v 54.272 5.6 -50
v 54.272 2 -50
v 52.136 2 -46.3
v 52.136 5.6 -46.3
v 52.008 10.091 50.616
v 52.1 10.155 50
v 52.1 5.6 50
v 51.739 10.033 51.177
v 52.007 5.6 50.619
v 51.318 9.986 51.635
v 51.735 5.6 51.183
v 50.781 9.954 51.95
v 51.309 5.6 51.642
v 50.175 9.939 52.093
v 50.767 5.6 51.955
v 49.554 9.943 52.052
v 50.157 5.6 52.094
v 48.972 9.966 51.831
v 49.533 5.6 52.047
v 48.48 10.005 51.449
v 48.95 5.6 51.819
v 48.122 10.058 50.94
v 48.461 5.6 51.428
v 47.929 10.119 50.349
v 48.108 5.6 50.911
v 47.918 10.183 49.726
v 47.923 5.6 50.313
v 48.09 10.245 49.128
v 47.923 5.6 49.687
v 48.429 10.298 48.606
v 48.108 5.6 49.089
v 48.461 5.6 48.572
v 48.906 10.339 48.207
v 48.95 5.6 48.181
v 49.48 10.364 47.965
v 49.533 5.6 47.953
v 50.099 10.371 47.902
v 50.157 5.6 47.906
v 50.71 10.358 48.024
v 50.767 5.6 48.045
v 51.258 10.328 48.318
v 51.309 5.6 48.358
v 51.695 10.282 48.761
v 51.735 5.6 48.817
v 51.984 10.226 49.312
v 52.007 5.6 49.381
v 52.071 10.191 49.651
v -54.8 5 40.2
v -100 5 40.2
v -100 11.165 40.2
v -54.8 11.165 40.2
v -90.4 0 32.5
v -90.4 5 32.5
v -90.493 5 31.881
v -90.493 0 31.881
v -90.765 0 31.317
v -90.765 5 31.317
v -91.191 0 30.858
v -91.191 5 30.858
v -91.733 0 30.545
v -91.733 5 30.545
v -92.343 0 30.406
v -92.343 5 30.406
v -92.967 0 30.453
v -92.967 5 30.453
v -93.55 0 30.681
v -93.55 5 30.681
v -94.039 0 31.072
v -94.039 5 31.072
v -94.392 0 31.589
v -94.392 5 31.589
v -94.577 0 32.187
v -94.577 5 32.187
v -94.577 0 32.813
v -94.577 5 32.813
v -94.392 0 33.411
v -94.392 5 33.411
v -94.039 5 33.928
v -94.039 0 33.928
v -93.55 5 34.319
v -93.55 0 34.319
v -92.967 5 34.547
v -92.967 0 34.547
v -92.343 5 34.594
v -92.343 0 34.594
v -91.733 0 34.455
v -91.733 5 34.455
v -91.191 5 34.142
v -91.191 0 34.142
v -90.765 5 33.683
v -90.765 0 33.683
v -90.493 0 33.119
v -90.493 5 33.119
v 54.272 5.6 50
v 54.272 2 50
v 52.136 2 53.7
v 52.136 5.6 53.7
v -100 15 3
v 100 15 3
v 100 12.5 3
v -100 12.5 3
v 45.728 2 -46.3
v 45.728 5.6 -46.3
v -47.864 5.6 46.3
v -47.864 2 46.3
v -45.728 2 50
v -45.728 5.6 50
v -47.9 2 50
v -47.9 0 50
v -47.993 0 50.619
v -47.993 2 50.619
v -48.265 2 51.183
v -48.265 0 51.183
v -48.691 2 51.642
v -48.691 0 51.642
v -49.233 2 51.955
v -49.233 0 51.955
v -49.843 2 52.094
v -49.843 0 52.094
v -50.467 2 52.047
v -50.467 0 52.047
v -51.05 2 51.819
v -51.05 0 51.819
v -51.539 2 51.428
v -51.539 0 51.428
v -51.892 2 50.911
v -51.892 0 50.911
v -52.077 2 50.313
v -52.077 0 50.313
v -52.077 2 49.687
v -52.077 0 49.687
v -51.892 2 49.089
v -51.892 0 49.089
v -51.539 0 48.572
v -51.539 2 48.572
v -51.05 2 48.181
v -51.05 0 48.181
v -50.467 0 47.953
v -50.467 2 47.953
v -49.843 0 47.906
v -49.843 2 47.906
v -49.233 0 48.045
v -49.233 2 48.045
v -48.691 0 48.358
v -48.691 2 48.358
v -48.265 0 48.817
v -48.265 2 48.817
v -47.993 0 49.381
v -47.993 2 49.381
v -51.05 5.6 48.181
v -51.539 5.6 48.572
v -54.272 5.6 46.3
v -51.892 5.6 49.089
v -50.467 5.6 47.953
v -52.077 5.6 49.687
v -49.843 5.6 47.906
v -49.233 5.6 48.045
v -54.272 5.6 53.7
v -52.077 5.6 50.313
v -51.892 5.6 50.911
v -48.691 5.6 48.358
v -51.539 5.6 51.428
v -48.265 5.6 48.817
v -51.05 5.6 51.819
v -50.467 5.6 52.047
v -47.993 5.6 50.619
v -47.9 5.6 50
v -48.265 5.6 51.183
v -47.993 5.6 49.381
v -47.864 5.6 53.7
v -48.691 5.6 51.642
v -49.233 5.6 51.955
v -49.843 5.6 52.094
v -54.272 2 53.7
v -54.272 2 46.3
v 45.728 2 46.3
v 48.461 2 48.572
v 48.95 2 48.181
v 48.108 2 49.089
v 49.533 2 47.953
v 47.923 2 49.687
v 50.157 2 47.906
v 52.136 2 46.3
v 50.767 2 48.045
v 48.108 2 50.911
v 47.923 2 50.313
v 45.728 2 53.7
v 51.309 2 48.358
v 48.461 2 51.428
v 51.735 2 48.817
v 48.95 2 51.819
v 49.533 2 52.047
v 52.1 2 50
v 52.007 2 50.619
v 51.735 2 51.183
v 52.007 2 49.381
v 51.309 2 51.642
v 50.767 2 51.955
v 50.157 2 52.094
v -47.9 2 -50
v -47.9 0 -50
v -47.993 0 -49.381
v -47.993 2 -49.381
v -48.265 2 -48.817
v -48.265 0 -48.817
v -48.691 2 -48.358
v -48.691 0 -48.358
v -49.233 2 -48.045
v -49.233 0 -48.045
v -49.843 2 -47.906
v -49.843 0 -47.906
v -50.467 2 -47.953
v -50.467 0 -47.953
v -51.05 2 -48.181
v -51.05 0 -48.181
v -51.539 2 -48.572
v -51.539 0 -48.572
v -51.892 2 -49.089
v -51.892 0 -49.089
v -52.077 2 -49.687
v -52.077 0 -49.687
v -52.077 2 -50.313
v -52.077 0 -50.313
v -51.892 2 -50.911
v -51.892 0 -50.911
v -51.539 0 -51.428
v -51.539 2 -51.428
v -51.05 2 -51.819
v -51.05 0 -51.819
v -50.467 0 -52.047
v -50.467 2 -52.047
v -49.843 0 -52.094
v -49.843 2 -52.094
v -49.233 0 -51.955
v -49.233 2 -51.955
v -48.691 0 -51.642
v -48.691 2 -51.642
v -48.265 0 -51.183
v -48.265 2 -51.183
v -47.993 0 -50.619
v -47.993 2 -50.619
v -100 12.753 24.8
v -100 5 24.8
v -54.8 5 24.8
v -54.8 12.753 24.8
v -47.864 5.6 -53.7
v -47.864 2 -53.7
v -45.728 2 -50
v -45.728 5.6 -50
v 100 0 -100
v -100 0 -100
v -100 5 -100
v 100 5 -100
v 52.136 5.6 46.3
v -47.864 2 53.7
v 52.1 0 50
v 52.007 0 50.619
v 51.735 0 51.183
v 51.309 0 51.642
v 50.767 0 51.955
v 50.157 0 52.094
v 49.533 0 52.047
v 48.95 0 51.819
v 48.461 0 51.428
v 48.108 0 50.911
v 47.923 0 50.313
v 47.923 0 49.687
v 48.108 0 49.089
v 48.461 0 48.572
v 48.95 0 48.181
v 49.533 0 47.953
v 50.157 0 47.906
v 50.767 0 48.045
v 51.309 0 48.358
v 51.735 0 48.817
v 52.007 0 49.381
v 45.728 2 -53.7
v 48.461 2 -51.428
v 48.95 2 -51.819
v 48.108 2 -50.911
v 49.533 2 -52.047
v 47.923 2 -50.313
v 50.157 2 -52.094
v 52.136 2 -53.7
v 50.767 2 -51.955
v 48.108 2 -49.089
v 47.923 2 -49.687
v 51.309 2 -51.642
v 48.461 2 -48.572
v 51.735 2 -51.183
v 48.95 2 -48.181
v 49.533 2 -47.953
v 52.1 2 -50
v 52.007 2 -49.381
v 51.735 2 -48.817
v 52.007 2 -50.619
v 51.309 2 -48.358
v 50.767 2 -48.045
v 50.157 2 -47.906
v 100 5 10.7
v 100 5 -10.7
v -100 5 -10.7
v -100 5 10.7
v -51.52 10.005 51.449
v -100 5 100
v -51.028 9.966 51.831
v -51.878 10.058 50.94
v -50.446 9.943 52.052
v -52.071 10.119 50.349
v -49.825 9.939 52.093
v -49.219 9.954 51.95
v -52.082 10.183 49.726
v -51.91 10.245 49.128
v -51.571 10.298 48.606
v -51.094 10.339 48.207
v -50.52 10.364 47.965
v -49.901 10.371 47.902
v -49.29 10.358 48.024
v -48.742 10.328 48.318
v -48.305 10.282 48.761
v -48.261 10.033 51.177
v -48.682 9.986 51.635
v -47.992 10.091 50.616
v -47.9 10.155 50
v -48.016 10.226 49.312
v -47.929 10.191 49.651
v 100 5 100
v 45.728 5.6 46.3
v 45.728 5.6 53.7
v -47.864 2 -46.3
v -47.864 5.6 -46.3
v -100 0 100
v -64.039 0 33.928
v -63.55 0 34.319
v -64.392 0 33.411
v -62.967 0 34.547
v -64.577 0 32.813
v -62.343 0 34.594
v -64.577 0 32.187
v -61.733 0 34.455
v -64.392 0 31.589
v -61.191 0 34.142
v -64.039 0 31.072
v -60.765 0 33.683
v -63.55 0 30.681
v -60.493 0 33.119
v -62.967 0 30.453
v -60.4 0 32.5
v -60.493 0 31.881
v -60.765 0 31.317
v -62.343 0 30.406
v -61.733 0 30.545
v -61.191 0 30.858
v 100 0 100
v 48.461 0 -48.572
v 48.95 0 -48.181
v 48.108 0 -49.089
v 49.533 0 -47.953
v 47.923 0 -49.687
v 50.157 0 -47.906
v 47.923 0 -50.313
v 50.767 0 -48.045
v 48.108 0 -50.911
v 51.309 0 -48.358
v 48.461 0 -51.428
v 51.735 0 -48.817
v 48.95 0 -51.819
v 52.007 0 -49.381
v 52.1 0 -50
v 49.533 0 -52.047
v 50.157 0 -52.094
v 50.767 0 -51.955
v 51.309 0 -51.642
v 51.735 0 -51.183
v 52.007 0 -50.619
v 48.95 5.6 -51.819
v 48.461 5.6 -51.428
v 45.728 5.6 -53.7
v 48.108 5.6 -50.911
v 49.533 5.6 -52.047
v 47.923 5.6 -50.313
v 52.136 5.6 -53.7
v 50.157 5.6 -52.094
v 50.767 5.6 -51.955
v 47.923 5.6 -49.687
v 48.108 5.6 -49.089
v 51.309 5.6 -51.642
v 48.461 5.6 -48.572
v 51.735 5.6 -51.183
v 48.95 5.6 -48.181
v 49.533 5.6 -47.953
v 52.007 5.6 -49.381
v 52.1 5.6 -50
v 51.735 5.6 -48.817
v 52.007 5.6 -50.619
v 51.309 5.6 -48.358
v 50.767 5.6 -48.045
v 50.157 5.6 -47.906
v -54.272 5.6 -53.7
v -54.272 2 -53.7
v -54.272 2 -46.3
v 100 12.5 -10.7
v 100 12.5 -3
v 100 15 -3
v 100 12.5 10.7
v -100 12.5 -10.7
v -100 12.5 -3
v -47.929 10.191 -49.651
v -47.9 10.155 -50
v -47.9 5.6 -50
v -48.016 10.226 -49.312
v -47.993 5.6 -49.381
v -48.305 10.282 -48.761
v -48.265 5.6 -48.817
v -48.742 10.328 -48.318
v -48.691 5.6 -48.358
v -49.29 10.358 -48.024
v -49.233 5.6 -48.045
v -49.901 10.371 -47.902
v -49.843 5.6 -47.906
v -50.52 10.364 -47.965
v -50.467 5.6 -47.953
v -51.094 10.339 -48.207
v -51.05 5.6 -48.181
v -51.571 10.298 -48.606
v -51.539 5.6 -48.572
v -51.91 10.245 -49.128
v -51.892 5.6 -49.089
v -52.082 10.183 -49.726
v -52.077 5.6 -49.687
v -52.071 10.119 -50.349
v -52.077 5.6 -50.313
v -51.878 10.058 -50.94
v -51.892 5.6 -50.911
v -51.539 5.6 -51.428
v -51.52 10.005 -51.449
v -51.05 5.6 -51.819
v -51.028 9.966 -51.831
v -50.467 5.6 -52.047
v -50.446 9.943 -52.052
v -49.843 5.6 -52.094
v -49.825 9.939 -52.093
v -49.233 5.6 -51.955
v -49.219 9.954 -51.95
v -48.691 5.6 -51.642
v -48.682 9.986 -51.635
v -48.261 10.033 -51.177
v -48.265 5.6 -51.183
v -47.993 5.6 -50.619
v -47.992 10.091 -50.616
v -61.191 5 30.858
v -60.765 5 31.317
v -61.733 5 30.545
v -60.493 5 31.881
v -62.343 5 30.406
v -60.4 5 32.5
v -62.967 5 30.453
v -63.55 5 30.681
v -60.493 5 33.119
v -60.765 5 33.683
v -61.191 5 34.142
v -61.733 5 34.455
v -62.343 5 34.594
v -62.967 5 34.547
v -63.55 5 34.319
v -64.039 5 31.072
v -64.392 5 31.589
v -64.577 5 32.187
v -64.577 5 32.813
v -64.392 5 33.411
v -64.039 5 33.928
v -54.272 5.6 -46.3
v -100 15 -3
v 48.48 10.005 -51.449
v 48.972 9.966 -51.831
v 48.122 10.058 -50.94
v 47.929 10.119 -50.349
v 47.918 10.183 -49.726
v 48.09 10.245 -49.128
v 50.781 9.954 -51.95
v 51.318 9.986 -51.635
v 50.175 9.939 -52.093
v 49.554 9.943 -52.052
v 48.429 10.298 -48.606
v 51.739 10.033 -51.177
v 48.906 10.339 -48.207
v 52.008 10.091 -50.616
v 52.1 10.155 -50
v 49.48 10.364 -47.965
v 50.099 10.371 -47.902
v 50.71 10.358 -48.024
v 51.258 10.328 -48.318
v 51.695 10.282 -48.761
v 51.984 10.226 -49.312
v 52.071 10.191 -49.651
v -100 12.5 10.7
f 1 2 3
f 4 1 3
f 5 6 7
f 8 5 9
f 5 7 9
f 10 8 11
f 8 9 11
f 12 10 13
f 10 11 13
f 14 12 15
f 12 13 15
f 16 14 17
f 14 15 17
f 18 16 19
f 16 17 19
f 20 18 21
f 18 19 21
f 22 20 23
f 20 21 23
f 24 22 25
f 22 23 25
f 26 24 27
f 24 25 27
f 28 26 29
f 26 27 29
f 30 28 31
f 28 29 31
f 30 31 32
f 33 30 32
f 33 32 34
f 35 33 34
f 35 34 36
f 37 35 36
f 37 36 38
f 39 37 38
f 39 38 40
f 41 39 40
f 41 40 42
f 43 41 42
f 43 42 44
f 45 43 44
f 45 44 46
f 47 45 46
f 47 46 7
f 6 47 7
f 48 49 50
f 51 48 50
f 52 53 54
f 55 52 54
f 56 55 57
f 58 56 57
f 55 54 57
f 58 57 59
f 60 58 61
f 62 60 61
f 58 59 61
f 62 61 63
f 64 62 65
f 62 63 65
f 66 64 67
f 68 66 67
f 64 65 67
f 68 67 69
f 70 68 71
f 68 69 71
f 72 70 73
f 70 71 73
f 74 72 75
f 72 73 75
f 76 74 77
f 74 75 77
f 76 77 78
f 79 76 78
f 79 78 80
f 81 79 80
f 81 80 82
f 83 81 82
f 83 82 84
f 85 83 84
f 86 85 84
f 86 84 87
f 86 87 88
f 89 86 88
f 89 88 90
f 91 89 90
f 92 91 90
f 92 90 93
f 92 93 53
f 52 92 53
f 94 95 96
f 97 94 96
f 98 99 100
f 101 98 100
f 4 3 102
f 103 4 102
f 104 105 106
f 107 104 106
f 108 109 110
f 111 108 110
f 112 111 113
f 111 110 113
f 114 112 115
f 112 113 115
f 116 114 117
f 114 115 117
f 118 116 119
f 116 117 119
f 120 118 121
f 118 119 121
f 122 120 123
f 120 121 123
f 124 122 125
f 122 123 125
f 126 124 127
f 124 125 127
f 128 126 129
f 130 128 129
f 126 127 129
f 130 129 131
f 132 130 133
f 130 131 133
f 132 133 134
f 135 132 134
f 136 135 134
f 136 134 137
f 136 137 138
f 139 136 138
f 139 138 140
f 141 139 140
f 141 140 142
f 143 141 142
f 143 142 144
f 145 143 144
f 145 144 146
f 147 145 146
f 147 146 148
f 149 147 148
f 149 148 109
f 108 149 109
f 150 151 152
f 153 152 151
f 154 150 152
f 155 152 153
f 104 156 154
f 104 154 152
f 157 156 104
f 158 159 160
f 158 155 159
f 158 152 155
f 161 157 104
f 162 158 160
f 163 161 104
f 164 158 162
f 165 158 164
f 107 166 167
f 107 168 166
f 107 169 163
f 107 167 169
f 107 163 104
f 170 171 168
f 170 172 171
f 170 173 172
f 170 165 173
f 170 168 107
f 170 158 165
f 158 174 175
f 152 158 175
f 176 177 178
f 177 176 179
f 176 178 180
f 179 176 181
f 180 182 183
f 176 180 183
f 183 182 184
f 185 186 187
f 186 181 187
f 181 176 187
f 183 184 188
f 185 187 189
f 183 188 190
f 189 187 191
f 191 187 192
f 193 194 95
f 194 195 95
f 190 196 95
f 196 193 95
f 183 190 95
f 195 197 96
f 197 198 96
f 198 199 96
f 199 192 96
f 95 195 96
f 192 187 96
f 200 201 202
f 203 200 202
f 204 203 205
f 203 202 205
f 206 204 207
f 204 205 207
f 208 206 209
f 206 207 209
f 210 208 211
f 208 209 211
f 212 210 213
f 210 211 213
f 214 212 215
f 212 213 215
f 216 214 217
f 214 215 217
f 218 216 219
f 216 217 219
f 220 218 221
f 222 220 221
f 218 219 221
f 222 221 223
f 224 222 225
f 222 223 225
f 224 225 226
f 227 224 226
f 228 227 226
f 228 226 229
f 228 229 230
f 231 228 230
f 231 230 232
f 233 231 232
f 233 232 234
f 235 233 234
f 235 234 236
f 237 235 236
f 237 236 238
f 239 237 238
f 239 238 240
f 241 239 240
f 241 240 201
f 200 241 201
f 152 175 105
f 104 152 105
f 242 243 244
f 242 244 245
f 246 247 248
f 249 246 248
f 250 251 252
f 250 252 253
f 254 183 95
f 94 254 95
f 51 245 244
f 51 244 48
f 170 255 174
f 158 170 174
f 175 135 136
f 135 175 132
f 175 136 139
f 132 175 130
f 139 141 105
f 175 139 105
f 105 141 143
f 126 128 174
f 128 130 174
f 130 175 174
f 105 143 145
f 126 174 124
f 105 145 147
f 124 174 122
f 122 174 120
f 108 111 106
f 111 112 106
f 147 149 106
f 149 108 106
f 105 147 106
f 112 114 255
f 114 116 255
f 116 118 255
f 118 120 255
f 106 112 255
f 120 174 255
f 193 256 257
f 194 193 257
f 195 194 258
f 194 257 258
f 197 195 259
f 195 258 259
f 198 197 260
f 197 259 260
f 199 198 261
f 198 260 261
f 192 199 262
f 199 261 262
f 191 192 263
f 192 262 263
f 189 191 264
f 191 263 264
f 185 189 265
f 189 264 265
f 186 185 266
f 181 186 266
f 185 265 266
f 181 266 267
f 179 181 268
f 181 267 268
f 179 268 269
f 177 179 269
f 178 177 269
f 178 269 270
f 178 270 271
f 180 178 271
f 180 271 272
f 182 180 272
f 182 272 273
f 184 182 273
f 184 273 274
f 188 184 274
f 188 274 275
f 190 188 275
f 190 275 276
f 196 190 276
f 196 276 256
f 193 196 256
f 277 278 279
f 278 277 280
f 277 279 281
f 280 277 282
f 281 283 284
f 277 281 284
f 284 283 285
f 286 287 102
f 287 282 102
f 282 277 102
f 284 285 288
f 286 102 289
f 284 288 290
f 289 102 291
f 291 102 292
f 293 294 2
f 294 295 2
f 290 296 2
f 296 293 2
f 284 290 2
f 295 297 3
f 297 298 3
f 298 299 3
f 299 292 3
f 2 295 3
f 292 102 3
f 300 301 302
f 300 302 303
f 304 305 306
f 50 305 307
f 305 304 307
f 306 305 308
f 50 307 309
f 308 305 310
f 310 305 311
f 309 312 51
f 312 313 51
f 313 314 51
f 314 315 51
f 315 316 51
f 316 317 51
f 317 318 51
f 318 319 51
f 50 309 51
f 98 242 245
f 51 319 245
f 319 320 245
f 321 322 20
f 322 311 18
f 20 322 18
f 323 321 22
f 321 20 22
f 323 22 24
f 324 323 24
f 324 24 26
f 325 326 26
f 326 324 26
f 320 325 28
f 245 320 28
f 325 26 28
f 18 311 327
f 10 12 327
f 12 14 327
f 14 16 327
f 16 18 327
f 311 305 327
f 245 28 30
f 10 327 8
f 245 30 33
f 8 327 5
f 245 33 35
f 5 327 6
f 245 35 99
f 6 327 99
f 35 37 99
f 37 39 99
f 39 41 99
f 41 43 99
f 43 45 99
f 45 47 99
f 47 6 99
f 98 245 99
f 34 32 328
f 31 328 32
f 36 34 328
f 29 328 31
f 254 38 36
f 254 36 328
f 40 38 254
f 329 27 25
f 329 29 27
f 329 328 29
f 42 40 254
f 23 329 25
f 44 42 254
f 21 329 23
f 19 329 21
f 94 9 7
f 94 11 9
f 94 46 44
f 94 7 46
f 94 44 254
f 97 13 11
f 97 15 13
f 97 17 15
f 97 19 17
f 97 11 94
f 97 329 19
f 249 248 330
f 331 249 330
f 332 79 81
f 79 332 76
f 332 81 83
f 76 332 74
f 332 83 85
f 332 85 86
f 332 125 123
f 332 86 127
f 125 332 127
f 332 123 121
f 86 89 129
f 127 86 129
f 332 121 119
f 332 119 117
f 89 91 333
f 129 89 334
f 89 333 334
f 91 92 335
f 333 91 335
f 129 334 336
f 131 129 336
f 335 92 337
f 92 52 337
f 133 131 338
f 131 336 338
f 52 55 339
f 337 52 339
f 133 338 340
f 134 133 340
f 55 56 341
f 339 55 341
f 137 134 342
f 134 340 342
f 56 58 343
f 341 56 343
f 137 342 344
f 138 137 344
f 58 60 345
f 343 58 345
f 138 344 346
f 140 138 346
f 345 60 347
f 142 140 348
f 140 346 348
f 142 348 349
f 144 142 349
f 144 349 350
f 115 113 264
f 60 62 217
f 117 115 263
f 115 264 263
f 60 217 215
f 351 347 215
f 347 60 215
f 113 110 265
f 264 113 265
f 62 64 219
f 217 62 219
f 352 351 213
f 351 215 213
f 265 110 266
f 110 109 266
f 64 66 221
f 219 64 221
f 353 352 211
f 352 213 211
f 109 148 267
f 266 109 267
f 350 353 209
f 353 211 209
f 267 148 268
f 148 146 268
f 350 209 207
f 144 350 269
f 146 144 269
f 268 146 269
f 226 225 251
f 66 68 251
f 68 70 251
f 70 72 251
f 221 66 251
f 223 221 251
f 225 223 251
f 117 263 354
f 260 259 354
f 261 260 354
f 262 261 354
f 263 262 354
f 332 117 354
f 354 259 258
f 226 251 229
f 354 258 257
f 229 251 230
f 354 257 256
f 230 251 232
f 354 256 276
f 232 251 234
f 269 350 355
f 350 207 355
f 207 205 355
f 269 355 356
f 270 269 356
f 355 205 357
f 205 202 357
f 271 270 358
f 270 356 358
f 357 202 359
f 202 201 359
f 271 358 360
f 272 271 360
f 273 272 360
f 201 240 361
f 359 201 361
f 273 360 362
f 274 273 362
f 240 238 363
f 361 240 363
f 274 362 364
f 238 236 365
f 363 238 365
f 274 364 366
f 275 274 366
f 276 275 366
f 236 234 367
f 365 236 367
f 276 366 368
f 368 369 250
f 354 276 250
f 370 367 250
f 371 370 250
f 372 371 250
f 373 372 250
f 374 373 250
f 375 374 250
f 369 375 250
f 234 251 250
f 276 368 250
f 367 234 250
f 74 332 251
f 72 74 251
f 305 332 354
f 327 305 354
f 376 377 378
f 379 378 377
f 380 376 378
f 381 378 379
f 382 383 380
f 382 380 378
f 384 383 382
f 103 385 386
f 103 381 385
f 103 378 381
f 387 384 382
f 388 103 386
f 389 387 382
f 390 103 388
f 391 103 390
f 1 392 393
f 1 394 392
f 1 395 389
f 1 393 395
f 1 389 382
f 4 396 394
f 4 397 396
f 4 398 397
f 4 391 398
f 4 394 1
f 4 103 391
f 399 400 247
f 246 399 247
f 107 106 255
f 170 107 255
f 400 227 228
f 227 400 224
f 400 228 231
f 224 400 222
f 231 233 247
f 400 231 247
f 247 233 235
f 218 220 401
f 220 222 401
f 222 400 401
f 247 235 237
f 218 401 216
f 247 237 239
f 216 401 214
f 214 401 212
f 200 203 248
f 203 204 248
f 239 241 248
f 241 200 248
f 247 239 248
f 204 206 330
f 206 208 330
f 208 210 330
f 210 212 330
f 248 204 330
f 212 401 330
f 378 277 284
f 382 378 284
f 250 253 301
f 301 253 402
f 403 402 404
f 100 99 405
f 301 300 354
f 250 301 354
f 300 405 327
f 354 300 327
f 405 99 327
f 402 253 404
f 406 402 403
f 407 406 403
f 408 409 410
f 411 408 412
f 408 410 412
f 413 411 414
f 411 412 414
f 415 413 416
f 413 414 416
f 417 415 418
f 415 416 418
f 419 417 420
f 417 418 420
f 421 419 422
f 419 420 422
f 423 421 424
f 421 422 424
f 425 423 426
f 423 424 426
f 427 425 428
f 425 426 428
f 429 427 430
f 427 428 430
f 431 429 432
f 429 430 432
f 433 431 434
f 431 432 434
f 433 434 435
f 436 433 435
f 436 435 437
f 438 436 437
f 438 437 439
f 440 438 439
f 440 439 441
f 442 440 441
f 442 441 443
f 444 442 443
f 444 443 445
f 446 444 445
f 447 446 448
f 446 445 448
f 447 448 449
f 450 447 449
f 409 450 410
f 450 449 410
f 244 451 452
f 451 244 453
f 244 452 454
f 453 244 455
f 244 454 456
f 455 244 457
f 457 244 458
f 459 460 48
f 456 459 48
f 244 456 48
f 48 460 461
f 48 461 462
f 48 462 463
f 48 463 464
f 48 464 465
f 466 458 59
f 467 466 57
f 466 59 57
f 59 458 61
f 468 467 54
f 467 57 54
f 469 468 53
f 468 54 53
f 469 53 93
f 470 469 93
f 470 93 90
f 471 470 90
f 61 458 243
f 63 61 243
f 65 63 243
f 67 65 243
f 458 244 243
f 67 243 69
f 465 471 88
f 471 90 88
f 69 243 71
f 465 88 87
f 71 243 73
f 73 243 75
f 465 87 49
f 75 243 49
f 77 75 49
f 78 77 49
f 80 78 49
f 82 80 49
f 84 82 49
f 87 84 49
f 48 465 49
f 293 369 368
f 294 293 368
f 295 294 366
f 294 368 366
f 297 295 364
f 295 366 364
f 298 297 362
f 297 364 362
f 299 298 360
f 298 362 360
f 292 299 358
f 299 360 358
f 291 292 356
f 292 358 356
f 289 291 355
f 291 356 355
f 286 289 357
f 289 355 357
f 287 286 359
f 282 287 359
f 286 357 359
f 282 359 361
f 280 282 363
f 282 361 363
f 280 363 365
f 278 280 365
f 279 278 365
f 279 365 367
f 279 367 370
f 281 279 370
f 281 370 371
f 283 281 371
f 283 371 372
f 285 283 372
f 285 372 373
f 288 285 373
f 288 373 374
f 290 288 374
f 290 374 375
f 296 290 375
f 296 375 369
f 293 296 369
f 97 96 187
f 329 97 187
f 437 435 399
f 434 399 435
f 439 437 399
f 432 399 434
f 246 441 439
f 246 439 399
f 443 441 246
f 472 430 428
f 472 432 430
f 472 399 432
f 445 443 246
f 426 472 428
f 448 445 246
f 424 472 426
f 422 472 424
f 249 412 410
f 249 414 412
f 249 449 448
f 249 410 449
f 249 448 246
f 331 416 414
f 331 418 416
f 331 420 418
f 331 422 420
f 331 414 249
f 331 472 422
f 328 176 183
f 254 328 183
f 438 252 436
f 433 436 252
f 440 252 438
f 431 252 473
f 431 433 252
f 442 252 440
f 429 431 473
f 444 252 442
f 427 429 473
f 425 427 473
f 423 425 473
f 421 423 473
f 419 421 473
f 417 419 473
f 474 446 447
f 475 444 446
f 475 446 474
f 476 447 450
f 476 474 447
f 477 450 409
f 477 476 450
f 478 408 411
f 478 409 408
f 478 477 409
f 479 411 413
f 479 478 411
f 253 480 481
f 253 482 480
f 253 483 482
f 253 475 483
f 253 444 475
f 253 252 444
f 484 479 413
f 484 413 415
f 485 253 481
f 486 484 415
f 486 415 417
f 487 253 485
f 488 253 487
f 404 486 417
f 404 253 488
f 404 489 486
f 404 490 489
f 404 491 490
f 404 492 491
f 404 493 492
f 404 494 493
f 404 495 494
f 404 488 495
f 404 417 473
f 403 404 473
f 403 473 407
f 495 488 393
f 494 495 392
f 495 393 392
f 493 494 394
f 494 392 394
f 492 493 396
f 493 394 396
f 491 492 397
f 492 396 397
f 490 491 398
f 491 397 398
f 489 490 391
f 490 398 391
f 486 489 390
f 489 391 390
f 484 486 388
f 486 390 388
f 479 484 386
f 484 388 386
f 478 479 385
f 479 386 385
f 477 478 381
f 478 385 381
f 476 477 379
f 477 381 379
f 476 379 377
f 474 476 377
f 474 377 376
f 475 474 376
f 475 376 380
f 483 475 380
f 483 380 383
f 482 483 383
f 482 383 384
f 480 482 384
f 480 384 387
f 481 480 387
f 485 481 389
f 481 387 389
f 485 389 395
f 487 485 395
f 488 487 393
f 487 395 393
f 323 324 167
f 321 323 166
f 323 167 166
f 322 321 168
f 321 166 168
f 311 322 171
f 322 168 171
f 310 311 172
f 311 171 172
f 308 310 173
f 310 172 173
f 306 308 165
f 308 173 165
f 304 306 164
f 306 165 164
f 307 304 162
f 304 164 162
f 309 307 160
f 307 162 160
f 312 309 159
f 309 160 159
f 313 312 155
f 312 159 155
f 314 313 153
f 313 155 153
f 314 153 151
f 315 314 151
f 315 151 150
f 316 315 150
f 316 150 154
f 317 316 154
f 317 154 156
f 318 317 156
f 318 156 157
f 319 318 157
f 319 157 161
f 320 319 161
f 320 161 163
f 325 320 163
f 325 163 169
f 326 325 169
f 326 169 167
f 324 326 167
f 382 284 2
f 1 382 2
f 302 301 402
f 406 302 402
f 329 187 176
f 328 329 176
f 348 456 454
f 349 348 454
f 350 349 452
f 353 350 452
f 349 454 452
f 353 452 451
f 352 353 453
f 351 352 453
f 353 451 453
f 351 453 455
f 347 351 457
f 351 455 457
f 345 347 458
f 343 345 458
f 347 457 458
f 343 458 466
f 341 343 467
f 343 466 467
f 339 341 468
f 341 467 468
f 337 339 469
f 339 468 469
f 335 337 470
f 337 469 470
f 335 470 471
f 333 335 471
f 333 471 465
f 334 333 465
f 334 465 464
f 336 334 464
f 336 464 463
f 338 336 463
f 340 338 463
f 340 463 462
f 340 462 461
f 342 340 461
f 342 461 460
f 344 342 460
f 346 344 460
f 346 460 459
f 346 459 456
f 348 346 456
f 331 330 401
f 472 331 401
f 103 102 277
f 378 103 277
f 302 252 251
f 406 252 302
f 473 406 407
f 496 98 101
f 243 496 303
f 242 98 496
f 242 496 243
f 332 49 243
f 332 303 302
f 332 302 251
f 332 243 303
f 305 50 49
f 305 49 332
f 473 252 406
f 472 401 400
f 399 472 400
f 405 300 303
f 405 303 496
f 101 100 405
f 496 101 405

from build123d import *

# Parameters (mm, degrees)
SKETCH1_W           = 200
SKETCH1_H           = 200
BOSS_EXTRUDE1_DEPTH = 5
BOSS_EXTRUDE2_DEPTH = 200
CUT_EXTRUDE9_START  = -200
SKETCH13_W          = 21.4
SKETCH13_H          = 7.5
CUT_EXTRUDE9_DEPTH  = 200
CUT_EXTRUDE14_START = -2
CUT_EXTRUDE14_DEPTH = 3.6
SKETCH17_R          = 2.1
CUT_EXTRUDE15_DEPTH = 16
SKETCH19_W          = 15.4
SKETCH19_H          = 7.75257732
CUT_EXTRUDE16_DEPTH = 45.2
SKETCH20_R          = 2.1
CUT_EXTRUDE17_DEPTH = 45


with BuildPart() as part:
    # Sketch1 → Boss-Extrude1 (new body)
    with BuildSketch(Plane(origin=(0, 0, 0), x_dir=(1, 0, 0), z_dir=(0, 1, 0))):
        Rectangle(SKETCH1_W, SKETCH1_H)
    extrude(amount=BOSS_EXTRUDE1_DEPTH)

    # Sketch9 → Boss-Extrude2 (add)
    with BuildSketch(Plane(origin=(100, 0, 0), x_dir=(0, 0, -1), z_dir=(1, 0, 0))):
        Polygon((-100, 5), (-3, 15), (-3, 5), align=None)
        Polygon((3, 5), (100, 5), (3, 15), align=None)
    extrude(amount=-BOSS_EXTRUDE2_DEPTH)

    # Sketch13 → Cut-Extrude9 (cut)
    with BuildSketch(Plane.ZY.offset(100).offset(CUT_EXTRUDE9_START)):
        with Locations((0, 8.75)):
            Rectangle(SKETCH13_W, SKETCH13_H)
    extrude(amount=CUT_EXTRUDE9_DEPTH, mode=Mode.SUBTRACT)

    # Sketch18 → Cut-Extrude14 (cut)
    with BuildSketch(Plane.XZ.offset(CUT_EXTRUDE14_START)):
        Polygon((-52.136195996, 46.3), (-47.863804004, 46.3), (-45.727608008, 50), (-47.863804004, 53.7), (-52.136195996, 53.7), (-54.272391992, 53.7), (-54.272391992, 46.3), align=None)
        Polygon((47.863804004, 46.3), (52.136195996, 46.3), (54.272391992, 50), (52.136195996, 53.7), (47.863804004, 53.7), (45.727608008, 53.7), (45.727608008, 46.3), align=None)
        Polygon((47.863804004, -53.7), (52.136195996, -53.7), (54.272391992, -50), (52.136195996, -46.3), (47.863804004, -46.3), (45.727608008, -46.3), (45.727608008, -53.7), align=None)
        Polygon((-52.136195996, -53.7), (-47.863804004, -53.7), (-45.727608008, -50), (-47.863804004, -46.3), (-52.136195996, -46.3), (-54.272391992, -46.3), (-54.272391992, -53.7), align=None)
    extrude(amount=-CUT_EXTRUDE14_DEPTH, mode=Mode.SUBTRACT)

    # Sketch17 → Cut-Extrude15 (cut, through all)
    with BuildSketch(Plane.XZ):
        with Locations((-50, 50)):
            Circle(SKETCH17_R)
        with Locations((50, 50)):
            Circle(SKETCH17_R)
        with Locations((50, -50)):
            Circle(SKETCH17_R)
        with Locations((-50, -50)):
            Circle(SKETCH17_R)
    extrude(amount=-CUT_EXTRUDE15_DEPTH, mode=Mode.SUBTRACT)

    # Sketch19 → Cut-Extrude16 (cut)
    with BuildSketch(Plane.ZY.offset(100)):
        with Locations((32.5, 8.87628866)):
            Rectangle(SKETCH19_W, SKETCH19_H)
    extrude(amount=-CUT_EXTRUDE16_DEPTH, mode=Mode.SUBTRACT)

    # Sketch20 → Cut-Extrude17 (cut)
    with BuildSketch(Plane(origin=(0, 5, 0), x_dir=(1, 0, 0), z_dir=(0, 1, 0))):
        with Locations((-92.5, -32.5)):
            Circle(SKETCH20_R)
        with Locations((-62.5, -32.5)):
            Circle(SKETCH20_R)
    extrude(amount=-CUT_EXTRUDE17_DEPTH, mode=Mode.SUBTRACT)


solid = part.part
